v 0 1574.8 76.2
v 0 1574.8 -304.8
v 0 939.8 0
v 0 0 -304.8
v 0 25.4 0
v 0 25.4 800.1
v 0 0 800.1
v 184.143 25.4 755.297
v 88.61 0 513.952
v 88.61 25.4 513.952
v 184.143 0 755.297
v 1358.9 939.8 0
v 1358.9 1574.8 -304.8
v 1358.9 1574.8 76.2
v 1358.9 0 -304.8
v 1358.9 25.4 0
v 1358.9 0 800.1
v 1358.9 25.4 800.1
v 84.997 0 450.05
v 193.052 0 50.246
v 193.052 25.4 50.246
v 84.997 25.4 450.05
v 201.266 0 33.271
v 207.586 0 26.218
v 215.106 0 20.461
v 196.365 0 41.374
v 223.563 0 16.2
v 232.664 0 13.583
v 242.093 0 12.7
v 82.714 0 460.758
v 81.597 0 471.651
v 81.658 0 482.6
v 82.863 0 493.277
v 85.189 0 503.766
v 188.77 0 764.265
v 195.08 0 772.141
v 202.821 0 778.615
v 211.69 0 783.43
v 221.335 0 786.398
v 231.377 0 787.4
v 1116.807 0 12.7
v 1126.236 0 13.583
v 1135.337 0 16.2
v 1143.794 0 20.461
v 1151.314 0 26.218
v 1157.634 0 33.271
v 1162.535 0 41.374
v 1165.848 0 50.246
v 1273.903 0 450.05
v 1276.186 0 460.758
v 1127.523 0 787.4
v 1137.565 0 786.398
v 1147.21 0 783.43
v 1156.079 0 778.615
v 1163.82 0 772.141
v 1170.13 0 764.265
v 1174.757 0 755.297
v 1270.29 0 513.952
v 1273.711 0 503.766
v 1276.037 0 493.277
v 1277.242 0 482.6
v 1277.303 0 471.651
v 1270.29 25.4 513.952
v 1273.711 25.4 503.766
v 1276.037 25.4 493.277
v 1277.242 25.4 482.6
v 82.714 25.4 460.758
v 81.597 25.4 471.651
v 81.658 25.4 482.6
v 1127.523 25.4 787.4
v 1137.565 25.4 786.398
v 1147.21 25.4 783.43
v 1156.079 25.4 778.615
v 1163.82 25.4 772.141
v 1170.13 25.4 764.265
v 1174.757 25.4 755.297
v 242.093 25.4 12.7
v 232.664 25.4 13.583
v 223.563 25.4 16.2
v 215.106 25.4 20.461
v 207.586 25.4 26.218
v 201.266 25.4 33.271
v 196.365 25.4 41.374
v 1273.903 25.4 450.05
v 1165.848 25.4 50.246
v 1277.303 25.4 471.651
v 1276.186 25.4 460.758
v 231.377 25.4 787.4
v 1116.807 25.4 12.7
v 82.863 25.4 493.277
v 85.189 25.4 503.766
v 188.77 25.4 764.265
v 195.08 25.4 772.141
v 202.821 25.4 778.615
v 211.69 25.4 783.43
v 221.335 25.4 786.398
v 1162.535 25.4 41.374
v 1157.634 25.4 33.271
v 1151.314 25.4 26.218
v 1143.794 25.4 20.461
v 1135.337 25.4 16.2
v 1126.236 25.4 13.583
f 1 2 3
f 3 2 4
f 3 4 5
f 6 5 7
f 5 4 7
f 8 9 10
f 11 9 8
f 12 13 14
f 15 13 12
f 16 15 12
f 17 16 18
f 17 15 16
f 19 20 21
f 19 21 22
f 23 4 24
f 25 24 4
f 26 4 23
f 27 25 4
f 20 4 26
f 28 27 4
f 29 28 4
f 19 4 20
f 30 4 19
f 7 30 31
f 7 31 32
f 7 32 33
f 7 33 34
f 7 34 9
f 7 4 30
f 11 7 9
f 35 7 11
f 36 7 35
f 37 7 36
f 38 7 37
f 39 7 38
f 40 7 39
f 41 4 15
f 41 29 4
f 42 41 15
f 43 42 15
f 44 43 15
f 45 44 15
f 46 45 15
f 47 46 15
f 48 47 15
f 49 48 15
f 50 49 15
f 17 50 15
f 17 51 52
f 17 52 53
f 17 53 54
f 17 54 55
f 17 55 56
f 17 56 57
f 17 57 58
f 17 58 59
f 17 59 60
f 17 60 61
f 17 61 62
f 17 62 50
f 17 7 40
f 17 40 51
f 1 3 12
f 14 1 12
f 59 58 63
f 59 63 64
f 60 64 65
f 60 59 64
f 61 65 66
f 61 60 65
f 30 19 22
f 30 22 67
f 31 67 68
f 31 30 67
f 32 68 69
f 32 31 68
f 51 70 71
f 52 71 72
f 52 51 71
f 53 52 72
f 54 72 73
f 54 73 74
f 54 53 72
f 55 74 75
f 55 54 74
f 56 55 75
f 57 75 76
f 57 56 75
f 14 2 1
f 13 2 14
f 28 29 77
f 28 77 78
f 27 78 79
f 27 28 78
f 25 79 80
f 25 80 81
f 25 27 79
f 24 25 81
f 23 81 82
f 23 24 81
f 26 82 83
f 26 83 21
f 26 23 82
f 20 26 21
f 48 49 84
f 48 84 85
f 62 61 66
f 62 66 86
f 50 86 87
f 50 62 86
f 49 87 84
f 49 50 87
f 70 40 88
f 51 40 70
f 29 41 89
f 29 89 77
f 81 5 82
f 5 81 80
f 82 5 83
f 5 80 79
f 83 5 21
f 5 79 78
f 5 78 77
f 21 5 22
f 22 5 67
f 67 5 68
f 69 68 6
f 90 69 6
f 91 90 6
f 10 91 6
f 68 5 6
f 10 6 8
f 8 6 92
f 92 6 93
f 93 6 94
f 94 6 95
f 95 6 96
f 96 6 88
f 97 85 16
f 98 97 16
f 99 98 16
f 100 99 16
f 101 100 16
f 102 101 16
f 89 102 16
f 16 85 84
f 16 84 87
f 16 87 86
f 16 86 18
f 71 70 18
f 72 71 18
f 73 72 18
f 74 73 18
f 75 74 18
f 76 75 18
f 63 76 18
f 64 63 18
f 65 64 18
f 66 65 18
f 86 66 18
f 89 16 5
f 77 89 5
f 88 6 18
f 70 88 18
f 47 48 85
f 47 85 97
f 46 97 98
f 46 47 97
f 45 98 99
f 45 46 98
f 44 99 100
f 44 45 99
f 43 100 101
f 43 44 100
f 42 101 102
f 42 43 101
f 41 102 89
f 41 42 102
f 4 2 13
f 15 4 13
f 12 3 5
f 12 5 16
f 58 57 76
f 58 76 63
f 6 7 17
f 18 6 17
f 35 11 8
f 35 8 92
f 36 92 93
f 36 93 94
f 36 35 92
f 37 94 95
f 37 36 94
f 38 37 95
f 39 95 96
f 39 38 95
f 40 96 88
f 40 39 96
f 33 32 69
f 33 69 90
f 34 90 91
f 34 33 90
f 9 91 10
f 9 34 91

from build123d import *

# Parameters (mm, degrees)
F0_W     = 1358.9
F0_H     = 635
F0_H_2   = 939.8
F1_DEPTH = 304.8
F2_DEPTH = 76.2
F3_SIZE2 = 76.19999
F3_SIZE  = 634.99999
F4_W     = 1358.9
F4_H     = 800.1
F5_DEPTH = 25.4


# Not quite as in the source:
# - a fillet or chamfer is up to 0.001 mm smaller than in the source, because OpenCascade refuses the exact size


with BuildPart() as f1:
    # F0 (on Top) → F1 (new body)
    with BuildSketch(Plane.XY):
        with Locations((679.45, 1257.3)):
            Rectangle(F0_W, F0_H)
        with Locations((679.45, 469.9)):
            Rectangle(F0_W, F0_H_2)
    extrude(amount=-F1_DEPTH)

    # F0 (on Top) → F2 (join)
    with BuildSketch(Plane.XY):
        with Locations((679.45, 1257.3)):
            Rectangle(F0_W, F0_H)
    extrude(amount=F2_DEPTH)

    # F3 (size 635 and 76.2 in the source; OpenCascade refuses exactly that, so slightly less here)
    f3_edges = [f1.edges().sort_by_distance(p)[0] for p in [
        (679.45, 939.8, 76.2),
    ]]
    f3_side = f1.faces().sort_by_distance((679.45, 1257.3, 76.2))[0]
    chamfer(f3_edges, length=F3_SIZE, length2=F3_SIZE2, reference=f3_side)

    # F4 (on face) → F5 (join)
    with BuildSketch(Plane.XZ):
        with Locations((679.45, 400.05)):
            Rectangle(F4_W, F4_H)
        with BuildLine():
            Line((1116.8070589646, 12.7), (242.0929410354, 12.7))
            ThreePointArc((242.0929410354, 12.7), (211.2114924509, 23.1642077886), (193.0524806695, 50.2458215227))
            Line((193.0524806695, 50.2458215227), (84.9974320158, 450.0495015416))
            ThreePointArc((84.9974320158, 450.0495015416), (82.0087933028, 466.189437514), (81.6581746464, 482.6))
            ThreePointArc((81.6581746464, 482.6), (83.887579714, 498.5521883341), (88.6100008594, 513.9515811185))
            Line((88.6100008594, 513.9515811185), (184.1425076023, 755.2968613112))
            ThreePointArc((184.1425076023, 755.2968613112), (202.8211285229, 778.6145245993), (231.3766835464, 787.4))
            Line((231.3766835464, 787.4), (1127.5233164536, 787.4))
            ThreePointArc((1127.5233164536, 787.4), (1156.0788714771, 778.6145245993), (1174.7574923977, 755.2968613112))
            Line((1174.7574923977, 755.2968613112), (1270.2899991406, 513.9515811185))
            ThreePointArc((1270.2899991406, 513.9515811185), (1275.012420286, 498.5521883341), (1277.2418253536, 482.6))
            ThreePointArc((1277.2418253536, 482.6), (1276.8912066972, 466.189437514), (1273.9025679842, 450.0495015416))
            Line((1273.9025679842, 450.0495015416), (1165.8475193305, 50.2458215227))
            ThreePointArc((1165.8475193305, 50.2458215227), (1147.6885075491, 23.1642077886), (1116.8070589646, 12.7))
        make_face(mode=Mode.SUBTRACT)
    extrude(amount=-F5_DEPTH)


solid = f1.part
